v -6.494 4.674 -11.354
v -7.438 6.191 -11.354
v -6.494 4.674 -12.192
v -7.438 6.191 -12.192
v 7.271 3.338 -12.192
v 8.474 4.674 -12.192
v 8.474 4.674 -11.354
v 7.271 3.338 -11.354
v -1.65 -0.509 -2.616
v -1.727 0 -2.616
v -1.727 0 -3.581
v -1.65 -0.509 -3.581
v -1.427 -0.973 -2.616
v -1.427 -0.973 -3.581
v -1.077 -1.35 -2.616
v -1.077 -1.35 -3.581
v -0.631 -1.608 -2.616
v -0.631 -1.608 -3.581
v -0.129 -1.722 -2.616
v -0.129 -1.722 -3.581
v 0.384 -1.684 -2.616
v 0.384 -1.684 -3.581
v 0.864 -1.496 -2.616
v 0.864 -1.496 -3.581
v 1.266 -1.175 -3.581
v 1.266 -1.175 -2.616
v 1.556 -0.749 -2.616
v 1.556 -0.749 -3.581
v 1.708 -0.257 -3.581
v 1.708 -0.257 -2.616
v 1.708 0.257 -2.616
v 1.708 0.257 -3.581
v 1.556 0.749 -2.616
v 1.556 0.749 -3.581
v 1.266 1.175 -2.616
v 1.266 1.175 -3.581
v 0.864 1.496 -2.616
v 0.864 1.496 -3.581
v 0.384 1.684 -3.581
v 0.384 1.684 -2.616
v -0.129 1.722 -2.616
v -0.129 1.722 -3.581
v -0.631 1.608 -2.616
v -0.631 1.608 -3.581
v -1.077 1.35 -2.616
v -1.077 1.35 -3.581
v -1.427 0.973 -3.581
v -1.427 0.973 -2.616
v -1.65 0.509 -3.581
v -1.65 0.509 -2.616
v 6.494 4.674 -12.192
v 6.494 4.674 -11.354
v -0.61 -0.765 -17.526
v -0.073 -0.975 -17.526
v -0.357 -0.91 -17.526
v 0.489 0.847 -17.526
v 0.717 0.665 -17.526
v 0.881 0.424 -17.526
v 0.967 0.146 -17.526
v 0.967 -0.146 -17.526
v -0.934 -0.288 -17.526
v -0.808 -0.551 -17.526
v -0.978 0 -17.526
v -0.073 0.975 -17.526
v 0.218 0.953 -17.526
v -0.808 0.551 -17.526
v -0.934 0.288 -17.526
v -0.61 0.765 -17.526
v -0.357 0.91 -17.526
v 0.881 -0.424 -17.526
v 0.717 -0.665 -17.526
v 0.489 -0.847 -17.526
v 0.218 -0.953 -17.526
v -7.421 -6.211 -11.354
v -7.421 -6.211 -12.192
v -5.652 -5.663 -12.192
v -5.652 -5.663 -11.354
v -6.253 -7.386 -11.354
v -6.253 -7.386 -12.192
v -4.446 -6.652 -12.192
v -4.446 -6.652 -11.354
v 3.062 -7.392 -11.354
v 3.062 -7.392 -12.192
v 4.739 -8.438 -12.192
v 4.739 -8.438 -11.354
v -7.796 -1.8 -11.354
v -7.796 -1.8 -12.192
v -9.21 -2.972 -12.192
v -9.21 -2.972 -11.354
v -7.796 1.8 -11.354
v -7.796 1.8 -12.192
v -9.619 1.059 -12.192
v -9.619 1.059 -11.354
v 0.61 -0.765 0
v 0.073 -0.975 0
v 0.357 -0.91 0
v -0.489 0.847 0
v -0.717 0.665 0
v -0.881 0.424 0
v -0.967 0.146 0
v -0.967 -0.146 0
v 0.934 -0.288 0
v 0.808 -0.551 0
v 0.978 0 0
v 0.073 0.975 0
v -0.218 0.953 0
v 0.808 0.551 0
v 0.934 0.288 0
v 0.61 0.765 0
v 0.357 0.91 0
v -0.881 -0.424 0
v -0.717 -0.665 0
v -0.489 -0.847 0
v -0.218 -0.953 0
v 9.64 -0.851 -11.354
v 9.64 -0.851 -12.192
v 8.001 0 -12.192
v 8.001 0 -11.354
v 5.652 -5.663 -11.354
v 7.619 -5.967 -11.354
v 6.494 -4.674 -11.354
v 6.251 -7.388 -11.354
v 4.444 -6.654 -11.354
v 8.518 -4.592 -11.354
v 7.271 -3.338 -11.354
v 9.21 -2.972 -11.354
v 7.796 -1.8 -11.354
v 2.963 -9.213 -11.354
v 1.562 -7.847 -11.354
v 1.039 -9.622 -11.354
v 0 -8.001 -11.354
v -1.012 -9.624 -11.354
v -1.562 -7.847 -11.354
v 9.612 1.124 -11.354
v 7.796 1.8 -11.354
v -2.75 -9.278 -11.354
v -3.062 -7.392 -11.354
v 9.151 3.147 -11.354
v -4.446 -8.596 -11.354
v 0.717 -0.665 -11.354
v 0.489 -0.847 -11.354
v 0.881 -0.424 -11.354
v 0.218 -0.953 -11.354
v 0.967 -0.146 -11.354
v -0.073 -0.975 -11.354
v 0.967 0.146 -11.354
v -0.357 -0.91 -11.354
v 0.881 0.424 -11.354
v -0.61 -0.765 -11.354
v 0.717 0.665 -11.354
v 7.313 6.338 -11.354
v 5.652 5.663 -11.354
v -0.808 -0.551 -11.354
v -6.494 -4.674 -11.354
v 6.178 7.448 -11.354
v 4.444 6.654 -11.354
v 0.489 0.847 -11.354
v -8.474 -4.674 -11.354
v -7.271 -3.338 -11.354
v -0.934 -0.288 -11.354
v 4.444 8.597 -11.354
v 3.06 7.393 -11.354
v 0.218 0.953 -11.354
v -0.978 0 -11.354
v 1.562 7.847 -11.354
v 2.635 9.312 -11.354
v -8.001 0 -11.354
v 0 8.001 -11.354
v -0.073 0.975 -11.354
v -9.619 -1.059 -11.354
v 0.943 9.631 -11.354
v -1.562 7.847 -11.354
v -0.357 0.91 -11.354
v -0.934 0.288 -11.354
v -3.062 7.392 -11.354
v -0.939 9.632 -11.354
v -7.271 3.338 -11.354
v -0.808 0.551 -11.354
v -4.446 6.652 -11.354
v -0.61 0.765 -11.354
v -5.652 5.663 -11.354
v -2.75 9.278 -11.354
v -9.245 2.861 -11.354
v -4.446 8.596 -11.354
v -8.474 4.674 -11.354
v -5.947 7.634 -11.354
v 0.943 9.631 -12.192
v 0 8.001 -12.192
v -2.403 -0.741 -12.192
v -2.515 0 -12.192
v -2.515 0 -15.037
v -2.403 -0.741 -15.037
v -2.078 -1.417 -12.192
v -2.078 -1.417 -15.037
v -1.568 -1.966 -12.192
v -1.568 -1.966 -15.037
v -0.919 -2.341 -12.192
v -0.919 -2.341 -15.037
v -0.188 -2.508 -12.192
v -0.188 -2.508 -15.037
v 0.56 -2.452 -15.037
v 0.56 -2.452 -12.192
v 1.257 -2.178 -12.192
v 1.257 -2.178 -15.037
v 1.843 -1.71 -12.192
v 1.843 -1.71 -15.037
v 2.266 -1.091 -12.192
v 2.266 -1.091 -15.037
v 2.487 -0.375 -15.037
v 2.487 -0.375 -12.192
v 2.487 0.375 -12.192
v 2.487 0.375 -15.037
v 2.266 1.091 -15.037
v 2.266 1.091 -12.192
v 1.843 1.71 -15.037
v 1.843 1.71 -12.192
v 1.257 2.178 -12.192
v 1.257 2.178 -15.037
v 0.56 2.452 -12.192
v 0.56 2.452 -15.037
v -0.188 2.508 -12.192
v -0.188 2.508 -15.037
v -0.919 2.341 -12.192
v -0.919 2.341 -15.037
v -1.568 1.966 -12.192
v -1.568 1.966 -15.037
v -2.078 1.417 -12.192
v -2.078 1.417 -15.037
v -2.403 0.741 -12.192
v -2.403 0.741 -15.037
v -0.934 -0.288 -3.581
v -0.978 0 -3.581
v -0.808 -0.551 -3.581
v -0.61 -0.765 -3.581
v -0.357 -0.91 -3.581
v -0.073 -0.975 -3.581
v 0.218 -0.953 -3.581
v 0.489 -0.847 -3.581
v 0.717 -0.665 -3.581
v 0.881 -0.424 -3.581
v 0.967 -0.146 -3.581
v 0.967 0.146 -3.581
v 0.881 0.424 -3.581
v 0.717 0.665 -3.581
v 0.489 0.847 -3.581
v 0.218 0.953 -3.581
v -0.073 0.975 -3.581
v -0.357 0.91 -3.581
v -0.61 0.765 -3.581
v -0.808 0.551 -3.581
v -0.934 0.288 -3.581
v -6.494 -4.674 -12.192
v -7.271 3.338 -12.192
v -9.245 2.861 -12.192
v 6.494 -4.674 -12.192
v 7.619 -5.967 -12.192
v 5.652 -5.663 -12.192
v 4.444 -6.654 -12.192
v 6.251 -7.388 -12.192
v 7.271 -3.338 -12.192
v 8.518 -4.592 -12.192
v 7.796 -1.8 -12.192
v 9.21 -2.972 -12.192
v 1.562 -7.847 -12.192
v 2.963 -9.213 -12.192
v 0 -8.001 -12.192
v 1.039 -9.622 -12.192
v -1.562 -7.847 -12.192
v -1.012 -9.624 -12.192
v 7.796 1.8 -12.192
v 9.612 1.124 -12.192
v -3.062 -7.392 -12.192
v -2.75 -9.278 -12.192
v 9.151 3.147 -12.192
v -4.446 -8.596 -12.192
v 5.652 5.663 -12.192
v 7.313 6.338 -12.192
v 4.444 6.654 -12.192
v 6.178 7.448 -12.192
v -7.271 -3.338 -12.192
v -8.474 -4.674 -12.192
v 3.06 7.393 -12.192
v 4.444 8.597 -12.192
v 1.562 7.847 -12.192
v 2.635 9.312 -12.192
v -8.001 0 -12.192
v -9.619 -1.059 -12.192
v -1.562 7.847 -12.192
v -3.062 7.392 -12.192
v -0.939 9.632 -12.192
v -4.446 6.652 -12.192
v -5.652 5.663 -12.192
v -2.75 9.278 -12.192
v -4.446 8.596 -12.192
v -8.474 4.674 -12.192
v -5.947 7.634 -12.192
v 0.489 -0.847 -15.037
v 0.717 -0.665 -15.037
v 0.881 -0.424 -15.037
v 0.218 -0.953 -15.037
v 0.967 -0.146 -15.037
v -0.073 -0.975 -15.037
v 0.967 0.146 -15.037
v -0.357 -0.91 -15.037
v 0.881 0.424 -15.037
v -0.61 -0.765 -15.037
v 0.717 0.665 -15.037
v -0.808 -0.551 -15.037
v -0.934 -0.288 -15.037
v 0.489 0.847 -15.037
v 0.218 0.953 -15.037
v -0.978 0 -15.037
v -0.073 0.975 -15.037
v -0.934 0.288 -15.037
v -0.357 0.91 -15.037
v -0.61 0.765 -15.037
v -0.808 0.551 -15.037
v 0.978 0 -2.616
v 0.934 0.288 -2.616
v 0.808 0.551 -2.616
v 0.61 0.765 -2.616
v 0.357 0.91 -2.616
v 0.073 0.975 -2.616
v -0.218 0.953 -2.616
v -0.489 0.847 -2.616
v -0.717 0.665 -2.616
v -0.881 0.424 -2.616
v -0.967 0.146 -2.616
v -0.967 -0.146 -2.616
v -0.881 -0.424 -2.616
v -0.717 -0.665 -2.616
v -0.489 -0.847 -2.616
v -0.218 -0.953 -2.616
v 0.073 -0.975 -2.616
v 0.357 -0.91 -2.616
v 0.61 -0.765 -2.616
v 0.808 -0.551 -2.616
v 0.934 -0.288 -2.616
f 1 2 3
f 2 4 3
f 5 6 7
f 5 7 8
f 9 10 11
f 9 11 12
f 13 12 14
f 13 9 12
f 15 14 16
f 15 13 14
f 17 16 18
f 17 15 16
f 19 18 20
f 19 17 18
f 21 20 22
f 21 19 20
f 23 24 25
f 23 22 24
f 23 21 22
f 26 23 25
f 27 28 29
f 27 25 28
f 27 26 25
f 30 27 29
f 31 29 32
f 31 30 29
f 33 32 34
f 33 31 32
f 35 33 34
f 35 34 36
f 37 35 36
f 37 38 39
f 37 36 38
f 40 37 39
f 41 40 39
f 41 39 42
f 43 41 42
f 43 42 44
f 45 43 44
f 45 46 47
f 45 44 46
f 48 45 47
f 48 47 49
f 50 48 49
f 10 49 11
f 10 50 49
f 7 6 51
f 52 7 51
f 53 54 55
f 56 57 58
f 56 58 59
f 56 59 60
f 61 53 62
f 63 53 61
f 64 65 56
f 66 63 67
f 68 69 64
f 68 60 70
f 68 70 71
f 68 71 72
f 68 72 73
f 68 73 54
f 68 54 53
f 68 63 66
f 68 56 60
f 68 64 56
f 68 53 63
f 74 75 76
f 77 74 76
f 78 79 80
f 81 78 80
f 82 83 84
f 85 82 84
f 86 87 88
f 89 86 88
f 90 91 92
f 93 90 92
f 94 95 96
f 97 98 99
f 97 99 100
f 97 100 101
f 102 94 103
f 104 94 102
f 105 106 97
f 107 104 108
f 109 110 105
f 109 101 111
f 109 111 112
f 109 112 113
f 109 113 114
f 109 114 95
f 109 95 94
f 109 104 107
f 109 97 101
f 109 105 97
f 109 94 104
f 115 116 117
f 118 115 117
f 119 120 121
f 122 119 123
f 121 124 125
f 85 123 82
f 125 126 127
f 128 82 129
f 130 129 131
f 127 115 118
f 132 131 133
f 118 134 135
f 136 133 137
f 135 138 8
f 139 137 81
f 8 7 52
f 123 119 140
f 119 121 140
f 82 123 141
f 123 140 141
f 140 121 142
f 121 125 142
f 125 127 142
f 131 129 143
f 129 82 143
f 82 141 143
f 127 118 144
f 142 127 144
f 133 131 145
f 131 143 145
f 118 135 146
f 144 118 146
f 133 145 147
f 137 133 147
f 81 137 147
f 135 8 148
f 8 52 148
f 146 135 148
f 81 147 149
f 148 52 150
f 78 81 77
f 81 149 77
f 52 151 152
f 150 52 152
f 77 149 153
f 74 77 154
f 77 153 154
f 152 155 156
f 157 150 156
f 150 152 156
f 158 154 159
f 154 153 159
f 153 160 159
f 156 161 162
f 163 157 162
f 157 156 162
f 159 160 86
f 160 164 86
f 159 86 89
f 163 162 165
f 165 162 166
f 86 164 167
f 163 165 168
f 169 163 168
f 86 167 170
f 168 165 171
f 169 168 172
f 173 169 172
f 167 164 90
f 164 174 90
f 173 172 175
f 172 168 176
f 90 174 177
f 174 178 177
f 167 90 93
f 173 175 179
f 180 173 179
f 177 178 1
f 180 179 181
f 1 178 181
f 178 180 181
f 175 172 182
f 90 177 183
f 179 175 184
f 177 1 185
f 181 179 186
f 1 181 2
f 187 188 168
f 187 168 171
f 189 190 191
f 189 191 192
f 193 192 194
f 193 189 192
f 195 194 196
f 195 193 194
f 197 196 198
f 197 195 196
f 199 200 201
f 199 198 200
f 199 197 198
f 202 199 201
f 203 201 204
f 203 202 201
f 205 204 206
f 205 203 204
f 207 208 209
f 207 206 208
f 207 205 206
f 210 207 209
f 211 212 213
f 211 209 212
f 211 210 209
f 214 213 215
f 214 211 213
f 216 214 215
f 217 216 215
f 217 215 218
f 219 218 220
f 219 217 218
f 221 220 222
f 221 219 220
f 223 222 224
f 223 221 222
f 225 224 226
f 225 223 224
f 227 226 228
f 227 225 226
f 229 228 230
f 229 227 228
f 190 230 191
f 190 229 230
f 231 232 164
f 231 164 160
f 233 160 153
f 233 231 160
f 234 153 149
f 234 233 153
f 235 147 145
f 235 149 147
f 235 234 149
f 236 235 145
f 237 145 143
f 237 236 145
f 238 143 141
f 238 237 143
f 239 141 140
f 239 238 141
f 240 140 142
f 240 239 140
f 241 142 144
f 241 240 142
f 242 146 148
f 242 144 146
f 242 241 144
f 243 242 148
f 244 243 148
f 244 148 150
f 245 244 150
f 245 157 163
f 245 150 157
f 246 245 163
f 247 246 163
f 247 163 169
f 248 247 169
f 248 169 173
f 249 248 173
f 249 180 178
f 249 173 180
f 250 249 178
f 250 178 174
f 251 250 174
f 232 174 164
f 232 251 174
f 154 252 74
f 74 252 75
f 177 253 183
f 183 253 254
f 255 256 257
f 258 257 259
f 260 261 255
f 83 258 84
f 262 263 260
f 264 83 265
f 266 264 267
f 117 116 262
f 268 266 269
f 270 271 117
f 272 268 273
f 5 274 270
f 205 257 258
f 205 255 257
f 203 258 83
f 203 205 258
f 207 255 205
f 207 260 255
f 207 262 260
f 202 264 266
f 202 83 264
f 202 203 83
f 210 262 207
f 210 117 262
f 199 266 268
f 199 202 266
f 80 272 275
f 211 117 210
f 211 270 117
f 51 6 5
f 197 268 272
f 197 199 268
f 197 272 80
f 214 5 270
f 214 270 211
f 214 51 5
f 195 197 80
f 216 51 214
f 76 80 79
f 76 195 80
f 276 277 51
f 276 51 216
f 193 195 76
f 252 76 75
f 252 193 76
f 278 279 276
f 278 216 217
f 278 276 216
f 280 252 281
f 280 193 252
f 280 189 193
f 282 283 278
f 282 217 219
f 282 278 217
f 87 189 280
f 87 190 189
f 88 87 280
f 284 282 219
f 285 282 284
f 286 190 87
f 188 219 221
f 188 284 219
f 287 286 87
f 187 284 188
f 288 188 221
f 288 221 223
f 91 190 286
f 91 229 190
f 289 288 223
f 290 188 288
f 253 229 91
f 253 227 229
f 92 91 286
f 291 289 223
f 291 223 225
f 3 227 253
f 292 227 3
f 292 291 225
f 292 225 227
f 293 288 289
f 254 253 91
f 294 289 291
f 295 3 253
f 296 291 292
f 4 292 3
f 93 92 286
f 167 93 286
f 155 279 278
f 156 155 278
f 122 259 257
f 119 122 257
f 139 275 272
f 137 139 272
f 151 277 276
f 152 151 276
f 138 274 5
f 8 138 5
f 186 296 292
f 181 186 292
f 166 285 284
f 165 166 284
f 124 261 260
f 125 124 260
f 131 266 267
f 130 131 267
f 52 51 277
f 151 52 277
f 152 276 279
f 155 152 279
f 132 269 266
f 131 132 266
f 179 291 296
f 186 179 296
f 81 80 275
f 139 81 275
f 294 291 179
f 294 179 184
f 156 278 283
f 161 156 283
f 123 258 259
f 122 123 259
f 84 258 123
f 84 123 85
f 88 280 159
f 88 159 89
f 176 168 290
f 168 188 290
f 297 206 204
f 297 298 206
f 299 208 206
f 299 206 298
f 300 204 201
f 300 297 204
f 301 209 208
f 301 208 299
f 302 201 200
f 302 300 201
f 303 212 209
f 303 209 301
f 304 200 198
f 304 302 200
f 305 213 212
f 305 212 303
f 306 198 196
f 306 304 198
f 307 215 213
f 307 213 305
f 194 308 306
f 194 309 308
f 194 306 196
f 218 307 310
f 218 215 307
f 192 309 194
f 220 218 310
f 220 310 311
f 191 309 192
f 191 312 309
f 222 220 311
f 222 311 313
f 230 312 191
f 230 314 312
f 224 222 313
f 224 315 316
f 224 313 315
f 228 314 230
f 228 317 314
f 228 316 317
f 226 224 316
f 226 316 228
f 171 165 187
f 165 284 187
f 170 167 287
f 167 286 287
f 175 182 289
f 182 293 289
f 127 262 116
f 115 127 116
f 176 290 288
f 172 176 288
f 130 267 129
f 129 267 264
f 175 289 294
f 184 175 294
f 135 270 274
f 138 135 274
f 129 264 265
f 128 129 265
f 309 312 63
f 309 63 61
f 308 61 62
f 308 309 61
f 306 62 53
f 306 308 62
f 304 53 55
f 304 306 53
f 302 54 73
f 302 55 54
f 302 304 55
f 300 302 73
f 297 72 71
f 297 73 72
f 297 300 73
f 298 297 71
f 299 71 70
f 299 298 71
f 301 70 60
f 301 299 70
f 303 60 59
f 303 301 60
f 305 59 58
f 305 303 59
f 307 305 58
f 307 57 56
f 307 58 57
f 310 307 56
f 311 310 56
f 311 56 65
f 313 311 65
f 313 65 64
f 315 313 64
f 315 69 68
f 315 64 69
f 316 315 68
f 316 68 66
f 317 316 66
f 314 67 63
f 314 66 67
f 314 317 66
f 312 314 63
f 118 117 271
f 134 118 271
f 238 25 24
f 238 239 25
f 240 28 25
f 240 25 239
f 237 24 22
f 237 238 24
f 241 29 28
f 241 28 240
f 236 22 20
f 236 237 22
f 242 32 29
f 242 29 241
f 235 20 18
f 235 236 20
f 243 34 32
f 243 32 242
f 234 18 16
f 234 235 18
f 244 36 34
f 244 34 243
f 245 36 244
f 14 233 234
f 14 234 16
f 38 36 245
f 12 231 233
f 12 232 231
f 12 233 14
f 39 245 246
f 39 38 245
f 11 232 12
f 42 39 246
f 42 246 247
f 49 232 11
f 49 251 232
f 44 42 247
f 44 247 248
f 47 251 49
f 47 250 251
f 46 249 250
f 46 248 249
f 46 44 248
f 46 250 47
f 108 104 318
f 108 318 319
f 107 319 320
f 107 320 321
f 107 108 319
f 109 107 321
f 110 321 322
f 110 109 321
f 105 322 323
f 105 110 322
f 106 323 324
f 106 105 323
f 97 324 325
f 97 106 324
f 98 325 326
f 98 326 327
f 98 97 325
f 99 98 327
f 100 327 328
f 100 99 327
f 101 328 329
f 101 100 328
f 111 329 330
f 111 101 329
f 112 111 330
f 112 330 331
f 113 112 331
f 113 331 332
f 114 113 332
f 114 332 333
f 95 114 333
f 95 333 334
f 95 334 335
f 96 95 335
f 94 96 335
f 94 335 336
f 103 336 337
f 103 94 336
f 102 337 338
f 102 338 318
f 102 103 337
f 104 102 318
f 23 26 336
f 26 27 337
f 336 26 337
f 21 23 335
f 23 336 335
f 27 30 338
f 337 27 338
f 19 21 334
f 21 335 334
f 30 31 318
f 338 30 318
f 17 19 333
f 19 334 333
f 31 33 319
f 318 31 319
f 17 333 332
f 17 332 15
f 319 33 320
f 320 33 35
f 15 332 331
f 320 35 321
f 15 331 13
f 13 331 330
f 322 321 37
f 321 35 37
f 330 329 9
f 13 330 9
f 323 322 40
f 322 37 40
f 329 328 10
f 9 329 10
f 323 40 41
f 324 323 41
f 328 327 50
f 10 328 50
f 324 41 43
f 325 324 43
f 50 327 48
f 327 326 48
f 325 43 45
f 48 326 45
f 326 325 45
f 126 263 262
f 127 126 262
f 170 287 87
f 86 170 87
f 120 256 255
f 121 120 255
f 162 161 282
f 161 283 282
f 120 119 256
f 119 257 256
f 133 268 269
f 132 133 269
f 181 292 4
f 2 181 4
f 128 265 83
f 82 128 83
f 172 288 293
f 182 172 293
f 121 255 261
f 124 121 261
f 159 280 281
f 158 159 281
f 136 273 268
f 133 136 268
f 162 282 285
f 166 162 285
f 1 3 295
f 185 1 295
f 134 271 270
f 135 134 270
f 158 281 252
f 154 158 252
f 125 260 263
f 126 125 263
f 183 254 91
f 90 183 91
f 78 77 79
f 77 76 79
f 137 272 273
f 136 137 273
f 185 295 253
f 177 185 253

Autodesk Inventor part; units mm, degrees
ref_plane "YZ Plane" through (0, 0, 0) normal (1, 0, 0) x (0, 1, 0)
ref_plane "XZ Plane" through (0, 0, 0) normal (0, 1, 0) x (-1, 0, 0)
ref_plane "XY Plane" through (0, 0, 0) normal (0, 0, 1) x (1, 0, 0)
sketch "Sketch1" plane through (0, 0, 0) normal (0, 0, 1) x (1, 0, 0)
  circle A0 centre (0, 0) radius 0.9779
  dimension "d0" = 1.9558
extrude "Extrusion1" add sketch "Sketch1" against normal blind 2.6162
sketch "Sketch2" plane through (0, 0, -2.6162) normal (0, 0, -1) x (-1, 0, 0)
  circle A0 centre (0, 0) radius 1.7272
  dimension "d3" = 3.4544
extrude "Extrusion2" add sketch "Sketch2" along normal blind 0.9652
sketch "Sketch3" plane through (0, 0, -3.5814) normal (0, 0, -1) x (-1, 0, 0)
  circle A0 centre (0, 0) radius 0.9779
extrude "Extrusion3" add sketch "Sketch3" along normal blind 7.7724
sketch "Sketch4" plane through (0, 0, -11.3538) normal (0, 0, -1) x (-1, 0, 0)
  circle A0 centre (0, 0) radius 8.001
  dimension "d8" = 16.002
extrude "Extrusion4" add sketch "Sketch4" along normal blind 0.8382
sketch "Sketch5" plane through (0, 0, -12.192) normal (0, 0, -1) x (-1, 0, 0)
  circle A0 centre (0, 0) radius 8.001 projected
  circle A1 centre (0, 0) radius 2.5146
  point P0 (-4.9792, 6.2629)
  point P1 (-3.3536, 7.2643)
  point P2 (-1.728, 7.8122)
  point P3 (-0.1024, 8.0003)
  point P4 (1.5232, 7.8547)
  point P5 (5.0214, 6.2291)
  point P6 (6.544, 4.6035)
  point P7 (7.4262, 2.9779)
  point P8 (7.8859, 1.3523)
  point P9 (7.9963, -0.2733)
  point P10 (7.7724, -1.8989)
  point P11 (7.1829, -3.5245)
  point P12 (6.1231, -5.1501)
  point P13 (4.4975, -6.6173)
  point P14 (2.8719, -7.4678)
  point P15 (1.2463, -7.9033)
  point P16 (-0.3793, -7.992)
  point P17 (-2.0049, -7.7457)
  point P18 (-3.6305, -7.1299)
  point P19 (-5.2561, -6.0323)
  point P20 (-6.8817, -4.0814)
  point P21 (-7.6148, -2.4558)
  point P22 (-7.9578, -0.8302)
  point P23 (-7.9614, 0.7954)
  point P24 (-7.6259, 2.421)
  point P25 (-6.9023, 4.0466)
  point P26 (-5.6429, 5.6722)
  point P27 (-3.3816, 7.2513)
  dimension "d11" = 1.6256
  dimension "d12" = 1.6256
  dimension "d13" = 1.6256
  dimension "d14" = 1.6256
  dimension "d15" = 1.6256
  dimension "d16" = 1.6256
  dimension "d17" = 1.6256
  dimension "d18" = 1.6256
  dimension "d19" = 1.6256
  dimension "d20" = 1.6256
  dimension "d21" = 1.6256
  dimension "d22" = 1.6256
  dimension "d23" = 1.6256
  dimension "d24" = 1.6256
  dimension "d25" = 1.6256
  dimension "d26" = 1.6256
  dimension "d27" = 1.6256
  dimension "d28" = 1.6256
  dimension "d29" = 1.6256
  dimension "d30" = 1.6256
  dimension "d32" = 1.6256
  dimension "d33" = 1.6256
  dimension "d34" = 1.6256
  dimension "d35" = 1.6256
  dimension "d36" = 1.6256
  dimension "d37" = 1.6256
  dimension "d39" = 5.0292
extrude "Extrusion5" add sketch "Sketch5" along normal blind 2.8448 contours A1
sketch "Sketch6" plane through (0, 0, -15.0368) normal (0, 0, -1) x (-1, 0, 0)
  circle A0 centre (0, 0) radius 0.9779
  dimension "d42" = 1.9558
extrude "Extrusion6" add sketch "Sketch6" along normal blind 2.4892
sketch "Sketch8" plane through (0, 0, -12.192) normal (0, 0, -1) x (-1, 0, 0)
  point P0 (0, 0)
sketch "Sketch9" plane through (0, 0, -12.192) normal (0, 0, -1) x (-1, 0, 0)
  circle A0 centre (0, 0) radius 8.001 projected
  circle A1 centre (0, 0) radius 9.6774
  line L0 (0, 8.001) -> (0.9393, 9.6317)
  line L1 (0.9393, 9.6317) -> (1.5623, 7.847)
  line L2 (1.5623, 7.847) -> (2.7497, 9.2785)
  line L3 (2.7497, 9.2785) -> (3.0623, 7.3918)
  line L4 (3.0623, 7.3918) -> (4.4462, 8.5955)
  line L5 (4.4462, 6.6518) -> (5.9473, 7.6343)
  line L6 (5.9473, 7.6343) -> (5.6517, 5.6634)
  line L7 (5.6517, 5.6634) -> (7.4382, 6.1907)
  line L8 (7.4382, 6.1907) -> (6.494, 4.6738)
  line L9 (6.494, 4.6738) -> (8.4739, 4.6738)
  line L10 (8.4739, 4.6738) -> (7.2714, 3.3381)
  line L11 (7.2714, 3.3381) -> (9.2449, 2.8608)
  line L12 (9.2449, 2.8608) -> (7.7959, 1.8)
  line L13 (7.7959, 1.8) -> (9.6193, 1.0592)
  line L14 (9.6193, 1.0592) -> (8.001, 0)
  line L15 (8.001, 0) -> (9.6193, -1.0592)
  line L16 (9.6193, -1.0592) -> (7.7959, -1.8)
  line L17 (7.7959, -1.8) -> (9.2096, -2.9725)
  line L18 (7.2714, -3.3381) -> (9.2096, -2.9725)
  line L19 (7.2714, -3.3381) -> (8.4739, -4.6738)
  line L20 (8.4739, -4.6738) -> (6.494, -4.6738)
  line L21 (6.494, -4.6738) -> (7.4212, -6.2111)
  line L22 (7.4212, -6.2111) -> (5.6517, -5.6634)
  line L23 (5.6517, -5.6634) -> (6.253, -7.3859)
  line L24 (6.253, -7.3859) -> (4.4462, -6.6518)
  line L25 (4.4462, -6.6518) -> (4.4462, -8.5955)
  line L26 (4.4462, -8.5955) -> (3.0623, -7.3918)
  line L27 (3.0623, -7.3918) -> (2.7497, -9.2785)
  line L28 (2.7497, -9.2785) -> (1.5623, -7.847)
  line L29 (1.5623, -7.847) -> (1.0123, -9.6243)
  line L30 (1.0123, -9.6243) -> (0, -8.001)
  line L31 (0, -8.001) -> (-1.0386, -9.6215)
  line L32 (-1.0386, -9.6215) -> (-1.5623, -7.847)
  line L33 (-1.5623, -7.847) -> (-2.9628, -9.2127)
  line L34 (-2.9628, -9.2127) -> (-3.0623, -7.3918)
  line L35 (-3.0623, -7.3918) -> (-4.7392, -8.4375)
  line L36 (-4.4437, -6.6536) -> (-4.7392, -8.4375)
  line L37 (-4.4437, -6.6536) -> (-6.2508, -7.3878)
  line L38 (-6.2508, -7.3878) -> (-5.6517, -5.6634)
  line L39 (-5.6517, -5.6634) -> (-7.6188, -5.967)
  line L40 (-7.6188, -5.967) -> (-6.494, -4.6738)
  line L41 (-6.494, -4.6738) -> (-8.5183, -4.5924)
  line L42 (-8.5183, -4.5924) -> (-7.2714, -3.3381)
  line L43 (-7.2714, -3.3381) -> (-9.2096, -2.9725)
  line L44 (-9.2096, -2.9725) -> (-7.7959, -1.8)
  line L45 (-7.7959, -1.8) -> (-9.6399, -0.851)
  line L46 (-9.6399, -0.851) -> (-8.001, 0)
  line L47 (-8.001, 0) -> (-9.612, 1.1235)
  line L48 (-9.612, 1.1235) -> (-7.7959, 1.8)
  line L49 (-7.7959, 1.8) -> (-9.1513, 3.1474)
  line L50 (-9.1513, 3.1474) -> (-7.2714, 3.3381)
  line L51 (-8.4739, 4.6738) -> (-7.2714, 3.3381)
  line L52 (-8.4739, 4.6738) -> (-6.494, 4.6738)
  line L53 (-6.494, 4.6738) -> (-7.3128, 6.3383)
  line L54 (-7.3128, 6.3383) -> (-5.6517, 5.6634)
  line L55 (-5.6517, 5.6634) -> (-6.1785, 7.4483)
  line L56 (-6.1785, 7.4483) -> (-4.4437, 6.6536)
  line L57 (-4.4437, 6.6536) -> (-4.4437, 8.5969)
  line L58 (-4.4437, 8.5969) -> (-3.0595, 7.3929)
  line L59 (-3.0595, 7.3929) -> (-2.6348, 9.3118)
  line L60 (-2.6348, 9.3118) -> (-1.5623, 7.847)
  line L61 (-1.5623, 7.847) -> (-0.9432, 9.6313)
  line L62 (0, 8.001) -> (-0.9432, 9.6313)
  line L63 (4.4462, 6.6518) -> (4.4462, 8.5955)
  point P0 (-4.4462, 6.6518)
  dimension "d71" = 19.3548
extrude "Extrusion7" add sketch "Sketch9" against normal blind 0.8382 contours L15 L16 A0 | A0 L13 L14 | A0 L11 L12 | L17 L18 A0 | A0 L9 L10 | L19 L20 A0 | A0 L7 L8 | L21 L22 A0 | A0 L5 L6 | L23 L24 A0 | A0 L4 L63 | L25 L26 A0 | A0 L2 L3 | L27 L28 A0 | A0 L0 L1 | L29 L30 A0 | A0 L61 L62 | L31 L32 A0 | A0 L59 L60 | L33 L34 A0 | A0 L57 L58 | L35 L36 A0 | A0 L55 L56 | L37 L38 A0 | A0 L53 L54 | L39 L40 A0 | A0 L51 L52 | L41 L42 A0 | A0 L49 L50 | L43 L44 A0 | A0 L47 L48 | L45 L46 A0
properties part number "gear" material "Aluminum 6061"
